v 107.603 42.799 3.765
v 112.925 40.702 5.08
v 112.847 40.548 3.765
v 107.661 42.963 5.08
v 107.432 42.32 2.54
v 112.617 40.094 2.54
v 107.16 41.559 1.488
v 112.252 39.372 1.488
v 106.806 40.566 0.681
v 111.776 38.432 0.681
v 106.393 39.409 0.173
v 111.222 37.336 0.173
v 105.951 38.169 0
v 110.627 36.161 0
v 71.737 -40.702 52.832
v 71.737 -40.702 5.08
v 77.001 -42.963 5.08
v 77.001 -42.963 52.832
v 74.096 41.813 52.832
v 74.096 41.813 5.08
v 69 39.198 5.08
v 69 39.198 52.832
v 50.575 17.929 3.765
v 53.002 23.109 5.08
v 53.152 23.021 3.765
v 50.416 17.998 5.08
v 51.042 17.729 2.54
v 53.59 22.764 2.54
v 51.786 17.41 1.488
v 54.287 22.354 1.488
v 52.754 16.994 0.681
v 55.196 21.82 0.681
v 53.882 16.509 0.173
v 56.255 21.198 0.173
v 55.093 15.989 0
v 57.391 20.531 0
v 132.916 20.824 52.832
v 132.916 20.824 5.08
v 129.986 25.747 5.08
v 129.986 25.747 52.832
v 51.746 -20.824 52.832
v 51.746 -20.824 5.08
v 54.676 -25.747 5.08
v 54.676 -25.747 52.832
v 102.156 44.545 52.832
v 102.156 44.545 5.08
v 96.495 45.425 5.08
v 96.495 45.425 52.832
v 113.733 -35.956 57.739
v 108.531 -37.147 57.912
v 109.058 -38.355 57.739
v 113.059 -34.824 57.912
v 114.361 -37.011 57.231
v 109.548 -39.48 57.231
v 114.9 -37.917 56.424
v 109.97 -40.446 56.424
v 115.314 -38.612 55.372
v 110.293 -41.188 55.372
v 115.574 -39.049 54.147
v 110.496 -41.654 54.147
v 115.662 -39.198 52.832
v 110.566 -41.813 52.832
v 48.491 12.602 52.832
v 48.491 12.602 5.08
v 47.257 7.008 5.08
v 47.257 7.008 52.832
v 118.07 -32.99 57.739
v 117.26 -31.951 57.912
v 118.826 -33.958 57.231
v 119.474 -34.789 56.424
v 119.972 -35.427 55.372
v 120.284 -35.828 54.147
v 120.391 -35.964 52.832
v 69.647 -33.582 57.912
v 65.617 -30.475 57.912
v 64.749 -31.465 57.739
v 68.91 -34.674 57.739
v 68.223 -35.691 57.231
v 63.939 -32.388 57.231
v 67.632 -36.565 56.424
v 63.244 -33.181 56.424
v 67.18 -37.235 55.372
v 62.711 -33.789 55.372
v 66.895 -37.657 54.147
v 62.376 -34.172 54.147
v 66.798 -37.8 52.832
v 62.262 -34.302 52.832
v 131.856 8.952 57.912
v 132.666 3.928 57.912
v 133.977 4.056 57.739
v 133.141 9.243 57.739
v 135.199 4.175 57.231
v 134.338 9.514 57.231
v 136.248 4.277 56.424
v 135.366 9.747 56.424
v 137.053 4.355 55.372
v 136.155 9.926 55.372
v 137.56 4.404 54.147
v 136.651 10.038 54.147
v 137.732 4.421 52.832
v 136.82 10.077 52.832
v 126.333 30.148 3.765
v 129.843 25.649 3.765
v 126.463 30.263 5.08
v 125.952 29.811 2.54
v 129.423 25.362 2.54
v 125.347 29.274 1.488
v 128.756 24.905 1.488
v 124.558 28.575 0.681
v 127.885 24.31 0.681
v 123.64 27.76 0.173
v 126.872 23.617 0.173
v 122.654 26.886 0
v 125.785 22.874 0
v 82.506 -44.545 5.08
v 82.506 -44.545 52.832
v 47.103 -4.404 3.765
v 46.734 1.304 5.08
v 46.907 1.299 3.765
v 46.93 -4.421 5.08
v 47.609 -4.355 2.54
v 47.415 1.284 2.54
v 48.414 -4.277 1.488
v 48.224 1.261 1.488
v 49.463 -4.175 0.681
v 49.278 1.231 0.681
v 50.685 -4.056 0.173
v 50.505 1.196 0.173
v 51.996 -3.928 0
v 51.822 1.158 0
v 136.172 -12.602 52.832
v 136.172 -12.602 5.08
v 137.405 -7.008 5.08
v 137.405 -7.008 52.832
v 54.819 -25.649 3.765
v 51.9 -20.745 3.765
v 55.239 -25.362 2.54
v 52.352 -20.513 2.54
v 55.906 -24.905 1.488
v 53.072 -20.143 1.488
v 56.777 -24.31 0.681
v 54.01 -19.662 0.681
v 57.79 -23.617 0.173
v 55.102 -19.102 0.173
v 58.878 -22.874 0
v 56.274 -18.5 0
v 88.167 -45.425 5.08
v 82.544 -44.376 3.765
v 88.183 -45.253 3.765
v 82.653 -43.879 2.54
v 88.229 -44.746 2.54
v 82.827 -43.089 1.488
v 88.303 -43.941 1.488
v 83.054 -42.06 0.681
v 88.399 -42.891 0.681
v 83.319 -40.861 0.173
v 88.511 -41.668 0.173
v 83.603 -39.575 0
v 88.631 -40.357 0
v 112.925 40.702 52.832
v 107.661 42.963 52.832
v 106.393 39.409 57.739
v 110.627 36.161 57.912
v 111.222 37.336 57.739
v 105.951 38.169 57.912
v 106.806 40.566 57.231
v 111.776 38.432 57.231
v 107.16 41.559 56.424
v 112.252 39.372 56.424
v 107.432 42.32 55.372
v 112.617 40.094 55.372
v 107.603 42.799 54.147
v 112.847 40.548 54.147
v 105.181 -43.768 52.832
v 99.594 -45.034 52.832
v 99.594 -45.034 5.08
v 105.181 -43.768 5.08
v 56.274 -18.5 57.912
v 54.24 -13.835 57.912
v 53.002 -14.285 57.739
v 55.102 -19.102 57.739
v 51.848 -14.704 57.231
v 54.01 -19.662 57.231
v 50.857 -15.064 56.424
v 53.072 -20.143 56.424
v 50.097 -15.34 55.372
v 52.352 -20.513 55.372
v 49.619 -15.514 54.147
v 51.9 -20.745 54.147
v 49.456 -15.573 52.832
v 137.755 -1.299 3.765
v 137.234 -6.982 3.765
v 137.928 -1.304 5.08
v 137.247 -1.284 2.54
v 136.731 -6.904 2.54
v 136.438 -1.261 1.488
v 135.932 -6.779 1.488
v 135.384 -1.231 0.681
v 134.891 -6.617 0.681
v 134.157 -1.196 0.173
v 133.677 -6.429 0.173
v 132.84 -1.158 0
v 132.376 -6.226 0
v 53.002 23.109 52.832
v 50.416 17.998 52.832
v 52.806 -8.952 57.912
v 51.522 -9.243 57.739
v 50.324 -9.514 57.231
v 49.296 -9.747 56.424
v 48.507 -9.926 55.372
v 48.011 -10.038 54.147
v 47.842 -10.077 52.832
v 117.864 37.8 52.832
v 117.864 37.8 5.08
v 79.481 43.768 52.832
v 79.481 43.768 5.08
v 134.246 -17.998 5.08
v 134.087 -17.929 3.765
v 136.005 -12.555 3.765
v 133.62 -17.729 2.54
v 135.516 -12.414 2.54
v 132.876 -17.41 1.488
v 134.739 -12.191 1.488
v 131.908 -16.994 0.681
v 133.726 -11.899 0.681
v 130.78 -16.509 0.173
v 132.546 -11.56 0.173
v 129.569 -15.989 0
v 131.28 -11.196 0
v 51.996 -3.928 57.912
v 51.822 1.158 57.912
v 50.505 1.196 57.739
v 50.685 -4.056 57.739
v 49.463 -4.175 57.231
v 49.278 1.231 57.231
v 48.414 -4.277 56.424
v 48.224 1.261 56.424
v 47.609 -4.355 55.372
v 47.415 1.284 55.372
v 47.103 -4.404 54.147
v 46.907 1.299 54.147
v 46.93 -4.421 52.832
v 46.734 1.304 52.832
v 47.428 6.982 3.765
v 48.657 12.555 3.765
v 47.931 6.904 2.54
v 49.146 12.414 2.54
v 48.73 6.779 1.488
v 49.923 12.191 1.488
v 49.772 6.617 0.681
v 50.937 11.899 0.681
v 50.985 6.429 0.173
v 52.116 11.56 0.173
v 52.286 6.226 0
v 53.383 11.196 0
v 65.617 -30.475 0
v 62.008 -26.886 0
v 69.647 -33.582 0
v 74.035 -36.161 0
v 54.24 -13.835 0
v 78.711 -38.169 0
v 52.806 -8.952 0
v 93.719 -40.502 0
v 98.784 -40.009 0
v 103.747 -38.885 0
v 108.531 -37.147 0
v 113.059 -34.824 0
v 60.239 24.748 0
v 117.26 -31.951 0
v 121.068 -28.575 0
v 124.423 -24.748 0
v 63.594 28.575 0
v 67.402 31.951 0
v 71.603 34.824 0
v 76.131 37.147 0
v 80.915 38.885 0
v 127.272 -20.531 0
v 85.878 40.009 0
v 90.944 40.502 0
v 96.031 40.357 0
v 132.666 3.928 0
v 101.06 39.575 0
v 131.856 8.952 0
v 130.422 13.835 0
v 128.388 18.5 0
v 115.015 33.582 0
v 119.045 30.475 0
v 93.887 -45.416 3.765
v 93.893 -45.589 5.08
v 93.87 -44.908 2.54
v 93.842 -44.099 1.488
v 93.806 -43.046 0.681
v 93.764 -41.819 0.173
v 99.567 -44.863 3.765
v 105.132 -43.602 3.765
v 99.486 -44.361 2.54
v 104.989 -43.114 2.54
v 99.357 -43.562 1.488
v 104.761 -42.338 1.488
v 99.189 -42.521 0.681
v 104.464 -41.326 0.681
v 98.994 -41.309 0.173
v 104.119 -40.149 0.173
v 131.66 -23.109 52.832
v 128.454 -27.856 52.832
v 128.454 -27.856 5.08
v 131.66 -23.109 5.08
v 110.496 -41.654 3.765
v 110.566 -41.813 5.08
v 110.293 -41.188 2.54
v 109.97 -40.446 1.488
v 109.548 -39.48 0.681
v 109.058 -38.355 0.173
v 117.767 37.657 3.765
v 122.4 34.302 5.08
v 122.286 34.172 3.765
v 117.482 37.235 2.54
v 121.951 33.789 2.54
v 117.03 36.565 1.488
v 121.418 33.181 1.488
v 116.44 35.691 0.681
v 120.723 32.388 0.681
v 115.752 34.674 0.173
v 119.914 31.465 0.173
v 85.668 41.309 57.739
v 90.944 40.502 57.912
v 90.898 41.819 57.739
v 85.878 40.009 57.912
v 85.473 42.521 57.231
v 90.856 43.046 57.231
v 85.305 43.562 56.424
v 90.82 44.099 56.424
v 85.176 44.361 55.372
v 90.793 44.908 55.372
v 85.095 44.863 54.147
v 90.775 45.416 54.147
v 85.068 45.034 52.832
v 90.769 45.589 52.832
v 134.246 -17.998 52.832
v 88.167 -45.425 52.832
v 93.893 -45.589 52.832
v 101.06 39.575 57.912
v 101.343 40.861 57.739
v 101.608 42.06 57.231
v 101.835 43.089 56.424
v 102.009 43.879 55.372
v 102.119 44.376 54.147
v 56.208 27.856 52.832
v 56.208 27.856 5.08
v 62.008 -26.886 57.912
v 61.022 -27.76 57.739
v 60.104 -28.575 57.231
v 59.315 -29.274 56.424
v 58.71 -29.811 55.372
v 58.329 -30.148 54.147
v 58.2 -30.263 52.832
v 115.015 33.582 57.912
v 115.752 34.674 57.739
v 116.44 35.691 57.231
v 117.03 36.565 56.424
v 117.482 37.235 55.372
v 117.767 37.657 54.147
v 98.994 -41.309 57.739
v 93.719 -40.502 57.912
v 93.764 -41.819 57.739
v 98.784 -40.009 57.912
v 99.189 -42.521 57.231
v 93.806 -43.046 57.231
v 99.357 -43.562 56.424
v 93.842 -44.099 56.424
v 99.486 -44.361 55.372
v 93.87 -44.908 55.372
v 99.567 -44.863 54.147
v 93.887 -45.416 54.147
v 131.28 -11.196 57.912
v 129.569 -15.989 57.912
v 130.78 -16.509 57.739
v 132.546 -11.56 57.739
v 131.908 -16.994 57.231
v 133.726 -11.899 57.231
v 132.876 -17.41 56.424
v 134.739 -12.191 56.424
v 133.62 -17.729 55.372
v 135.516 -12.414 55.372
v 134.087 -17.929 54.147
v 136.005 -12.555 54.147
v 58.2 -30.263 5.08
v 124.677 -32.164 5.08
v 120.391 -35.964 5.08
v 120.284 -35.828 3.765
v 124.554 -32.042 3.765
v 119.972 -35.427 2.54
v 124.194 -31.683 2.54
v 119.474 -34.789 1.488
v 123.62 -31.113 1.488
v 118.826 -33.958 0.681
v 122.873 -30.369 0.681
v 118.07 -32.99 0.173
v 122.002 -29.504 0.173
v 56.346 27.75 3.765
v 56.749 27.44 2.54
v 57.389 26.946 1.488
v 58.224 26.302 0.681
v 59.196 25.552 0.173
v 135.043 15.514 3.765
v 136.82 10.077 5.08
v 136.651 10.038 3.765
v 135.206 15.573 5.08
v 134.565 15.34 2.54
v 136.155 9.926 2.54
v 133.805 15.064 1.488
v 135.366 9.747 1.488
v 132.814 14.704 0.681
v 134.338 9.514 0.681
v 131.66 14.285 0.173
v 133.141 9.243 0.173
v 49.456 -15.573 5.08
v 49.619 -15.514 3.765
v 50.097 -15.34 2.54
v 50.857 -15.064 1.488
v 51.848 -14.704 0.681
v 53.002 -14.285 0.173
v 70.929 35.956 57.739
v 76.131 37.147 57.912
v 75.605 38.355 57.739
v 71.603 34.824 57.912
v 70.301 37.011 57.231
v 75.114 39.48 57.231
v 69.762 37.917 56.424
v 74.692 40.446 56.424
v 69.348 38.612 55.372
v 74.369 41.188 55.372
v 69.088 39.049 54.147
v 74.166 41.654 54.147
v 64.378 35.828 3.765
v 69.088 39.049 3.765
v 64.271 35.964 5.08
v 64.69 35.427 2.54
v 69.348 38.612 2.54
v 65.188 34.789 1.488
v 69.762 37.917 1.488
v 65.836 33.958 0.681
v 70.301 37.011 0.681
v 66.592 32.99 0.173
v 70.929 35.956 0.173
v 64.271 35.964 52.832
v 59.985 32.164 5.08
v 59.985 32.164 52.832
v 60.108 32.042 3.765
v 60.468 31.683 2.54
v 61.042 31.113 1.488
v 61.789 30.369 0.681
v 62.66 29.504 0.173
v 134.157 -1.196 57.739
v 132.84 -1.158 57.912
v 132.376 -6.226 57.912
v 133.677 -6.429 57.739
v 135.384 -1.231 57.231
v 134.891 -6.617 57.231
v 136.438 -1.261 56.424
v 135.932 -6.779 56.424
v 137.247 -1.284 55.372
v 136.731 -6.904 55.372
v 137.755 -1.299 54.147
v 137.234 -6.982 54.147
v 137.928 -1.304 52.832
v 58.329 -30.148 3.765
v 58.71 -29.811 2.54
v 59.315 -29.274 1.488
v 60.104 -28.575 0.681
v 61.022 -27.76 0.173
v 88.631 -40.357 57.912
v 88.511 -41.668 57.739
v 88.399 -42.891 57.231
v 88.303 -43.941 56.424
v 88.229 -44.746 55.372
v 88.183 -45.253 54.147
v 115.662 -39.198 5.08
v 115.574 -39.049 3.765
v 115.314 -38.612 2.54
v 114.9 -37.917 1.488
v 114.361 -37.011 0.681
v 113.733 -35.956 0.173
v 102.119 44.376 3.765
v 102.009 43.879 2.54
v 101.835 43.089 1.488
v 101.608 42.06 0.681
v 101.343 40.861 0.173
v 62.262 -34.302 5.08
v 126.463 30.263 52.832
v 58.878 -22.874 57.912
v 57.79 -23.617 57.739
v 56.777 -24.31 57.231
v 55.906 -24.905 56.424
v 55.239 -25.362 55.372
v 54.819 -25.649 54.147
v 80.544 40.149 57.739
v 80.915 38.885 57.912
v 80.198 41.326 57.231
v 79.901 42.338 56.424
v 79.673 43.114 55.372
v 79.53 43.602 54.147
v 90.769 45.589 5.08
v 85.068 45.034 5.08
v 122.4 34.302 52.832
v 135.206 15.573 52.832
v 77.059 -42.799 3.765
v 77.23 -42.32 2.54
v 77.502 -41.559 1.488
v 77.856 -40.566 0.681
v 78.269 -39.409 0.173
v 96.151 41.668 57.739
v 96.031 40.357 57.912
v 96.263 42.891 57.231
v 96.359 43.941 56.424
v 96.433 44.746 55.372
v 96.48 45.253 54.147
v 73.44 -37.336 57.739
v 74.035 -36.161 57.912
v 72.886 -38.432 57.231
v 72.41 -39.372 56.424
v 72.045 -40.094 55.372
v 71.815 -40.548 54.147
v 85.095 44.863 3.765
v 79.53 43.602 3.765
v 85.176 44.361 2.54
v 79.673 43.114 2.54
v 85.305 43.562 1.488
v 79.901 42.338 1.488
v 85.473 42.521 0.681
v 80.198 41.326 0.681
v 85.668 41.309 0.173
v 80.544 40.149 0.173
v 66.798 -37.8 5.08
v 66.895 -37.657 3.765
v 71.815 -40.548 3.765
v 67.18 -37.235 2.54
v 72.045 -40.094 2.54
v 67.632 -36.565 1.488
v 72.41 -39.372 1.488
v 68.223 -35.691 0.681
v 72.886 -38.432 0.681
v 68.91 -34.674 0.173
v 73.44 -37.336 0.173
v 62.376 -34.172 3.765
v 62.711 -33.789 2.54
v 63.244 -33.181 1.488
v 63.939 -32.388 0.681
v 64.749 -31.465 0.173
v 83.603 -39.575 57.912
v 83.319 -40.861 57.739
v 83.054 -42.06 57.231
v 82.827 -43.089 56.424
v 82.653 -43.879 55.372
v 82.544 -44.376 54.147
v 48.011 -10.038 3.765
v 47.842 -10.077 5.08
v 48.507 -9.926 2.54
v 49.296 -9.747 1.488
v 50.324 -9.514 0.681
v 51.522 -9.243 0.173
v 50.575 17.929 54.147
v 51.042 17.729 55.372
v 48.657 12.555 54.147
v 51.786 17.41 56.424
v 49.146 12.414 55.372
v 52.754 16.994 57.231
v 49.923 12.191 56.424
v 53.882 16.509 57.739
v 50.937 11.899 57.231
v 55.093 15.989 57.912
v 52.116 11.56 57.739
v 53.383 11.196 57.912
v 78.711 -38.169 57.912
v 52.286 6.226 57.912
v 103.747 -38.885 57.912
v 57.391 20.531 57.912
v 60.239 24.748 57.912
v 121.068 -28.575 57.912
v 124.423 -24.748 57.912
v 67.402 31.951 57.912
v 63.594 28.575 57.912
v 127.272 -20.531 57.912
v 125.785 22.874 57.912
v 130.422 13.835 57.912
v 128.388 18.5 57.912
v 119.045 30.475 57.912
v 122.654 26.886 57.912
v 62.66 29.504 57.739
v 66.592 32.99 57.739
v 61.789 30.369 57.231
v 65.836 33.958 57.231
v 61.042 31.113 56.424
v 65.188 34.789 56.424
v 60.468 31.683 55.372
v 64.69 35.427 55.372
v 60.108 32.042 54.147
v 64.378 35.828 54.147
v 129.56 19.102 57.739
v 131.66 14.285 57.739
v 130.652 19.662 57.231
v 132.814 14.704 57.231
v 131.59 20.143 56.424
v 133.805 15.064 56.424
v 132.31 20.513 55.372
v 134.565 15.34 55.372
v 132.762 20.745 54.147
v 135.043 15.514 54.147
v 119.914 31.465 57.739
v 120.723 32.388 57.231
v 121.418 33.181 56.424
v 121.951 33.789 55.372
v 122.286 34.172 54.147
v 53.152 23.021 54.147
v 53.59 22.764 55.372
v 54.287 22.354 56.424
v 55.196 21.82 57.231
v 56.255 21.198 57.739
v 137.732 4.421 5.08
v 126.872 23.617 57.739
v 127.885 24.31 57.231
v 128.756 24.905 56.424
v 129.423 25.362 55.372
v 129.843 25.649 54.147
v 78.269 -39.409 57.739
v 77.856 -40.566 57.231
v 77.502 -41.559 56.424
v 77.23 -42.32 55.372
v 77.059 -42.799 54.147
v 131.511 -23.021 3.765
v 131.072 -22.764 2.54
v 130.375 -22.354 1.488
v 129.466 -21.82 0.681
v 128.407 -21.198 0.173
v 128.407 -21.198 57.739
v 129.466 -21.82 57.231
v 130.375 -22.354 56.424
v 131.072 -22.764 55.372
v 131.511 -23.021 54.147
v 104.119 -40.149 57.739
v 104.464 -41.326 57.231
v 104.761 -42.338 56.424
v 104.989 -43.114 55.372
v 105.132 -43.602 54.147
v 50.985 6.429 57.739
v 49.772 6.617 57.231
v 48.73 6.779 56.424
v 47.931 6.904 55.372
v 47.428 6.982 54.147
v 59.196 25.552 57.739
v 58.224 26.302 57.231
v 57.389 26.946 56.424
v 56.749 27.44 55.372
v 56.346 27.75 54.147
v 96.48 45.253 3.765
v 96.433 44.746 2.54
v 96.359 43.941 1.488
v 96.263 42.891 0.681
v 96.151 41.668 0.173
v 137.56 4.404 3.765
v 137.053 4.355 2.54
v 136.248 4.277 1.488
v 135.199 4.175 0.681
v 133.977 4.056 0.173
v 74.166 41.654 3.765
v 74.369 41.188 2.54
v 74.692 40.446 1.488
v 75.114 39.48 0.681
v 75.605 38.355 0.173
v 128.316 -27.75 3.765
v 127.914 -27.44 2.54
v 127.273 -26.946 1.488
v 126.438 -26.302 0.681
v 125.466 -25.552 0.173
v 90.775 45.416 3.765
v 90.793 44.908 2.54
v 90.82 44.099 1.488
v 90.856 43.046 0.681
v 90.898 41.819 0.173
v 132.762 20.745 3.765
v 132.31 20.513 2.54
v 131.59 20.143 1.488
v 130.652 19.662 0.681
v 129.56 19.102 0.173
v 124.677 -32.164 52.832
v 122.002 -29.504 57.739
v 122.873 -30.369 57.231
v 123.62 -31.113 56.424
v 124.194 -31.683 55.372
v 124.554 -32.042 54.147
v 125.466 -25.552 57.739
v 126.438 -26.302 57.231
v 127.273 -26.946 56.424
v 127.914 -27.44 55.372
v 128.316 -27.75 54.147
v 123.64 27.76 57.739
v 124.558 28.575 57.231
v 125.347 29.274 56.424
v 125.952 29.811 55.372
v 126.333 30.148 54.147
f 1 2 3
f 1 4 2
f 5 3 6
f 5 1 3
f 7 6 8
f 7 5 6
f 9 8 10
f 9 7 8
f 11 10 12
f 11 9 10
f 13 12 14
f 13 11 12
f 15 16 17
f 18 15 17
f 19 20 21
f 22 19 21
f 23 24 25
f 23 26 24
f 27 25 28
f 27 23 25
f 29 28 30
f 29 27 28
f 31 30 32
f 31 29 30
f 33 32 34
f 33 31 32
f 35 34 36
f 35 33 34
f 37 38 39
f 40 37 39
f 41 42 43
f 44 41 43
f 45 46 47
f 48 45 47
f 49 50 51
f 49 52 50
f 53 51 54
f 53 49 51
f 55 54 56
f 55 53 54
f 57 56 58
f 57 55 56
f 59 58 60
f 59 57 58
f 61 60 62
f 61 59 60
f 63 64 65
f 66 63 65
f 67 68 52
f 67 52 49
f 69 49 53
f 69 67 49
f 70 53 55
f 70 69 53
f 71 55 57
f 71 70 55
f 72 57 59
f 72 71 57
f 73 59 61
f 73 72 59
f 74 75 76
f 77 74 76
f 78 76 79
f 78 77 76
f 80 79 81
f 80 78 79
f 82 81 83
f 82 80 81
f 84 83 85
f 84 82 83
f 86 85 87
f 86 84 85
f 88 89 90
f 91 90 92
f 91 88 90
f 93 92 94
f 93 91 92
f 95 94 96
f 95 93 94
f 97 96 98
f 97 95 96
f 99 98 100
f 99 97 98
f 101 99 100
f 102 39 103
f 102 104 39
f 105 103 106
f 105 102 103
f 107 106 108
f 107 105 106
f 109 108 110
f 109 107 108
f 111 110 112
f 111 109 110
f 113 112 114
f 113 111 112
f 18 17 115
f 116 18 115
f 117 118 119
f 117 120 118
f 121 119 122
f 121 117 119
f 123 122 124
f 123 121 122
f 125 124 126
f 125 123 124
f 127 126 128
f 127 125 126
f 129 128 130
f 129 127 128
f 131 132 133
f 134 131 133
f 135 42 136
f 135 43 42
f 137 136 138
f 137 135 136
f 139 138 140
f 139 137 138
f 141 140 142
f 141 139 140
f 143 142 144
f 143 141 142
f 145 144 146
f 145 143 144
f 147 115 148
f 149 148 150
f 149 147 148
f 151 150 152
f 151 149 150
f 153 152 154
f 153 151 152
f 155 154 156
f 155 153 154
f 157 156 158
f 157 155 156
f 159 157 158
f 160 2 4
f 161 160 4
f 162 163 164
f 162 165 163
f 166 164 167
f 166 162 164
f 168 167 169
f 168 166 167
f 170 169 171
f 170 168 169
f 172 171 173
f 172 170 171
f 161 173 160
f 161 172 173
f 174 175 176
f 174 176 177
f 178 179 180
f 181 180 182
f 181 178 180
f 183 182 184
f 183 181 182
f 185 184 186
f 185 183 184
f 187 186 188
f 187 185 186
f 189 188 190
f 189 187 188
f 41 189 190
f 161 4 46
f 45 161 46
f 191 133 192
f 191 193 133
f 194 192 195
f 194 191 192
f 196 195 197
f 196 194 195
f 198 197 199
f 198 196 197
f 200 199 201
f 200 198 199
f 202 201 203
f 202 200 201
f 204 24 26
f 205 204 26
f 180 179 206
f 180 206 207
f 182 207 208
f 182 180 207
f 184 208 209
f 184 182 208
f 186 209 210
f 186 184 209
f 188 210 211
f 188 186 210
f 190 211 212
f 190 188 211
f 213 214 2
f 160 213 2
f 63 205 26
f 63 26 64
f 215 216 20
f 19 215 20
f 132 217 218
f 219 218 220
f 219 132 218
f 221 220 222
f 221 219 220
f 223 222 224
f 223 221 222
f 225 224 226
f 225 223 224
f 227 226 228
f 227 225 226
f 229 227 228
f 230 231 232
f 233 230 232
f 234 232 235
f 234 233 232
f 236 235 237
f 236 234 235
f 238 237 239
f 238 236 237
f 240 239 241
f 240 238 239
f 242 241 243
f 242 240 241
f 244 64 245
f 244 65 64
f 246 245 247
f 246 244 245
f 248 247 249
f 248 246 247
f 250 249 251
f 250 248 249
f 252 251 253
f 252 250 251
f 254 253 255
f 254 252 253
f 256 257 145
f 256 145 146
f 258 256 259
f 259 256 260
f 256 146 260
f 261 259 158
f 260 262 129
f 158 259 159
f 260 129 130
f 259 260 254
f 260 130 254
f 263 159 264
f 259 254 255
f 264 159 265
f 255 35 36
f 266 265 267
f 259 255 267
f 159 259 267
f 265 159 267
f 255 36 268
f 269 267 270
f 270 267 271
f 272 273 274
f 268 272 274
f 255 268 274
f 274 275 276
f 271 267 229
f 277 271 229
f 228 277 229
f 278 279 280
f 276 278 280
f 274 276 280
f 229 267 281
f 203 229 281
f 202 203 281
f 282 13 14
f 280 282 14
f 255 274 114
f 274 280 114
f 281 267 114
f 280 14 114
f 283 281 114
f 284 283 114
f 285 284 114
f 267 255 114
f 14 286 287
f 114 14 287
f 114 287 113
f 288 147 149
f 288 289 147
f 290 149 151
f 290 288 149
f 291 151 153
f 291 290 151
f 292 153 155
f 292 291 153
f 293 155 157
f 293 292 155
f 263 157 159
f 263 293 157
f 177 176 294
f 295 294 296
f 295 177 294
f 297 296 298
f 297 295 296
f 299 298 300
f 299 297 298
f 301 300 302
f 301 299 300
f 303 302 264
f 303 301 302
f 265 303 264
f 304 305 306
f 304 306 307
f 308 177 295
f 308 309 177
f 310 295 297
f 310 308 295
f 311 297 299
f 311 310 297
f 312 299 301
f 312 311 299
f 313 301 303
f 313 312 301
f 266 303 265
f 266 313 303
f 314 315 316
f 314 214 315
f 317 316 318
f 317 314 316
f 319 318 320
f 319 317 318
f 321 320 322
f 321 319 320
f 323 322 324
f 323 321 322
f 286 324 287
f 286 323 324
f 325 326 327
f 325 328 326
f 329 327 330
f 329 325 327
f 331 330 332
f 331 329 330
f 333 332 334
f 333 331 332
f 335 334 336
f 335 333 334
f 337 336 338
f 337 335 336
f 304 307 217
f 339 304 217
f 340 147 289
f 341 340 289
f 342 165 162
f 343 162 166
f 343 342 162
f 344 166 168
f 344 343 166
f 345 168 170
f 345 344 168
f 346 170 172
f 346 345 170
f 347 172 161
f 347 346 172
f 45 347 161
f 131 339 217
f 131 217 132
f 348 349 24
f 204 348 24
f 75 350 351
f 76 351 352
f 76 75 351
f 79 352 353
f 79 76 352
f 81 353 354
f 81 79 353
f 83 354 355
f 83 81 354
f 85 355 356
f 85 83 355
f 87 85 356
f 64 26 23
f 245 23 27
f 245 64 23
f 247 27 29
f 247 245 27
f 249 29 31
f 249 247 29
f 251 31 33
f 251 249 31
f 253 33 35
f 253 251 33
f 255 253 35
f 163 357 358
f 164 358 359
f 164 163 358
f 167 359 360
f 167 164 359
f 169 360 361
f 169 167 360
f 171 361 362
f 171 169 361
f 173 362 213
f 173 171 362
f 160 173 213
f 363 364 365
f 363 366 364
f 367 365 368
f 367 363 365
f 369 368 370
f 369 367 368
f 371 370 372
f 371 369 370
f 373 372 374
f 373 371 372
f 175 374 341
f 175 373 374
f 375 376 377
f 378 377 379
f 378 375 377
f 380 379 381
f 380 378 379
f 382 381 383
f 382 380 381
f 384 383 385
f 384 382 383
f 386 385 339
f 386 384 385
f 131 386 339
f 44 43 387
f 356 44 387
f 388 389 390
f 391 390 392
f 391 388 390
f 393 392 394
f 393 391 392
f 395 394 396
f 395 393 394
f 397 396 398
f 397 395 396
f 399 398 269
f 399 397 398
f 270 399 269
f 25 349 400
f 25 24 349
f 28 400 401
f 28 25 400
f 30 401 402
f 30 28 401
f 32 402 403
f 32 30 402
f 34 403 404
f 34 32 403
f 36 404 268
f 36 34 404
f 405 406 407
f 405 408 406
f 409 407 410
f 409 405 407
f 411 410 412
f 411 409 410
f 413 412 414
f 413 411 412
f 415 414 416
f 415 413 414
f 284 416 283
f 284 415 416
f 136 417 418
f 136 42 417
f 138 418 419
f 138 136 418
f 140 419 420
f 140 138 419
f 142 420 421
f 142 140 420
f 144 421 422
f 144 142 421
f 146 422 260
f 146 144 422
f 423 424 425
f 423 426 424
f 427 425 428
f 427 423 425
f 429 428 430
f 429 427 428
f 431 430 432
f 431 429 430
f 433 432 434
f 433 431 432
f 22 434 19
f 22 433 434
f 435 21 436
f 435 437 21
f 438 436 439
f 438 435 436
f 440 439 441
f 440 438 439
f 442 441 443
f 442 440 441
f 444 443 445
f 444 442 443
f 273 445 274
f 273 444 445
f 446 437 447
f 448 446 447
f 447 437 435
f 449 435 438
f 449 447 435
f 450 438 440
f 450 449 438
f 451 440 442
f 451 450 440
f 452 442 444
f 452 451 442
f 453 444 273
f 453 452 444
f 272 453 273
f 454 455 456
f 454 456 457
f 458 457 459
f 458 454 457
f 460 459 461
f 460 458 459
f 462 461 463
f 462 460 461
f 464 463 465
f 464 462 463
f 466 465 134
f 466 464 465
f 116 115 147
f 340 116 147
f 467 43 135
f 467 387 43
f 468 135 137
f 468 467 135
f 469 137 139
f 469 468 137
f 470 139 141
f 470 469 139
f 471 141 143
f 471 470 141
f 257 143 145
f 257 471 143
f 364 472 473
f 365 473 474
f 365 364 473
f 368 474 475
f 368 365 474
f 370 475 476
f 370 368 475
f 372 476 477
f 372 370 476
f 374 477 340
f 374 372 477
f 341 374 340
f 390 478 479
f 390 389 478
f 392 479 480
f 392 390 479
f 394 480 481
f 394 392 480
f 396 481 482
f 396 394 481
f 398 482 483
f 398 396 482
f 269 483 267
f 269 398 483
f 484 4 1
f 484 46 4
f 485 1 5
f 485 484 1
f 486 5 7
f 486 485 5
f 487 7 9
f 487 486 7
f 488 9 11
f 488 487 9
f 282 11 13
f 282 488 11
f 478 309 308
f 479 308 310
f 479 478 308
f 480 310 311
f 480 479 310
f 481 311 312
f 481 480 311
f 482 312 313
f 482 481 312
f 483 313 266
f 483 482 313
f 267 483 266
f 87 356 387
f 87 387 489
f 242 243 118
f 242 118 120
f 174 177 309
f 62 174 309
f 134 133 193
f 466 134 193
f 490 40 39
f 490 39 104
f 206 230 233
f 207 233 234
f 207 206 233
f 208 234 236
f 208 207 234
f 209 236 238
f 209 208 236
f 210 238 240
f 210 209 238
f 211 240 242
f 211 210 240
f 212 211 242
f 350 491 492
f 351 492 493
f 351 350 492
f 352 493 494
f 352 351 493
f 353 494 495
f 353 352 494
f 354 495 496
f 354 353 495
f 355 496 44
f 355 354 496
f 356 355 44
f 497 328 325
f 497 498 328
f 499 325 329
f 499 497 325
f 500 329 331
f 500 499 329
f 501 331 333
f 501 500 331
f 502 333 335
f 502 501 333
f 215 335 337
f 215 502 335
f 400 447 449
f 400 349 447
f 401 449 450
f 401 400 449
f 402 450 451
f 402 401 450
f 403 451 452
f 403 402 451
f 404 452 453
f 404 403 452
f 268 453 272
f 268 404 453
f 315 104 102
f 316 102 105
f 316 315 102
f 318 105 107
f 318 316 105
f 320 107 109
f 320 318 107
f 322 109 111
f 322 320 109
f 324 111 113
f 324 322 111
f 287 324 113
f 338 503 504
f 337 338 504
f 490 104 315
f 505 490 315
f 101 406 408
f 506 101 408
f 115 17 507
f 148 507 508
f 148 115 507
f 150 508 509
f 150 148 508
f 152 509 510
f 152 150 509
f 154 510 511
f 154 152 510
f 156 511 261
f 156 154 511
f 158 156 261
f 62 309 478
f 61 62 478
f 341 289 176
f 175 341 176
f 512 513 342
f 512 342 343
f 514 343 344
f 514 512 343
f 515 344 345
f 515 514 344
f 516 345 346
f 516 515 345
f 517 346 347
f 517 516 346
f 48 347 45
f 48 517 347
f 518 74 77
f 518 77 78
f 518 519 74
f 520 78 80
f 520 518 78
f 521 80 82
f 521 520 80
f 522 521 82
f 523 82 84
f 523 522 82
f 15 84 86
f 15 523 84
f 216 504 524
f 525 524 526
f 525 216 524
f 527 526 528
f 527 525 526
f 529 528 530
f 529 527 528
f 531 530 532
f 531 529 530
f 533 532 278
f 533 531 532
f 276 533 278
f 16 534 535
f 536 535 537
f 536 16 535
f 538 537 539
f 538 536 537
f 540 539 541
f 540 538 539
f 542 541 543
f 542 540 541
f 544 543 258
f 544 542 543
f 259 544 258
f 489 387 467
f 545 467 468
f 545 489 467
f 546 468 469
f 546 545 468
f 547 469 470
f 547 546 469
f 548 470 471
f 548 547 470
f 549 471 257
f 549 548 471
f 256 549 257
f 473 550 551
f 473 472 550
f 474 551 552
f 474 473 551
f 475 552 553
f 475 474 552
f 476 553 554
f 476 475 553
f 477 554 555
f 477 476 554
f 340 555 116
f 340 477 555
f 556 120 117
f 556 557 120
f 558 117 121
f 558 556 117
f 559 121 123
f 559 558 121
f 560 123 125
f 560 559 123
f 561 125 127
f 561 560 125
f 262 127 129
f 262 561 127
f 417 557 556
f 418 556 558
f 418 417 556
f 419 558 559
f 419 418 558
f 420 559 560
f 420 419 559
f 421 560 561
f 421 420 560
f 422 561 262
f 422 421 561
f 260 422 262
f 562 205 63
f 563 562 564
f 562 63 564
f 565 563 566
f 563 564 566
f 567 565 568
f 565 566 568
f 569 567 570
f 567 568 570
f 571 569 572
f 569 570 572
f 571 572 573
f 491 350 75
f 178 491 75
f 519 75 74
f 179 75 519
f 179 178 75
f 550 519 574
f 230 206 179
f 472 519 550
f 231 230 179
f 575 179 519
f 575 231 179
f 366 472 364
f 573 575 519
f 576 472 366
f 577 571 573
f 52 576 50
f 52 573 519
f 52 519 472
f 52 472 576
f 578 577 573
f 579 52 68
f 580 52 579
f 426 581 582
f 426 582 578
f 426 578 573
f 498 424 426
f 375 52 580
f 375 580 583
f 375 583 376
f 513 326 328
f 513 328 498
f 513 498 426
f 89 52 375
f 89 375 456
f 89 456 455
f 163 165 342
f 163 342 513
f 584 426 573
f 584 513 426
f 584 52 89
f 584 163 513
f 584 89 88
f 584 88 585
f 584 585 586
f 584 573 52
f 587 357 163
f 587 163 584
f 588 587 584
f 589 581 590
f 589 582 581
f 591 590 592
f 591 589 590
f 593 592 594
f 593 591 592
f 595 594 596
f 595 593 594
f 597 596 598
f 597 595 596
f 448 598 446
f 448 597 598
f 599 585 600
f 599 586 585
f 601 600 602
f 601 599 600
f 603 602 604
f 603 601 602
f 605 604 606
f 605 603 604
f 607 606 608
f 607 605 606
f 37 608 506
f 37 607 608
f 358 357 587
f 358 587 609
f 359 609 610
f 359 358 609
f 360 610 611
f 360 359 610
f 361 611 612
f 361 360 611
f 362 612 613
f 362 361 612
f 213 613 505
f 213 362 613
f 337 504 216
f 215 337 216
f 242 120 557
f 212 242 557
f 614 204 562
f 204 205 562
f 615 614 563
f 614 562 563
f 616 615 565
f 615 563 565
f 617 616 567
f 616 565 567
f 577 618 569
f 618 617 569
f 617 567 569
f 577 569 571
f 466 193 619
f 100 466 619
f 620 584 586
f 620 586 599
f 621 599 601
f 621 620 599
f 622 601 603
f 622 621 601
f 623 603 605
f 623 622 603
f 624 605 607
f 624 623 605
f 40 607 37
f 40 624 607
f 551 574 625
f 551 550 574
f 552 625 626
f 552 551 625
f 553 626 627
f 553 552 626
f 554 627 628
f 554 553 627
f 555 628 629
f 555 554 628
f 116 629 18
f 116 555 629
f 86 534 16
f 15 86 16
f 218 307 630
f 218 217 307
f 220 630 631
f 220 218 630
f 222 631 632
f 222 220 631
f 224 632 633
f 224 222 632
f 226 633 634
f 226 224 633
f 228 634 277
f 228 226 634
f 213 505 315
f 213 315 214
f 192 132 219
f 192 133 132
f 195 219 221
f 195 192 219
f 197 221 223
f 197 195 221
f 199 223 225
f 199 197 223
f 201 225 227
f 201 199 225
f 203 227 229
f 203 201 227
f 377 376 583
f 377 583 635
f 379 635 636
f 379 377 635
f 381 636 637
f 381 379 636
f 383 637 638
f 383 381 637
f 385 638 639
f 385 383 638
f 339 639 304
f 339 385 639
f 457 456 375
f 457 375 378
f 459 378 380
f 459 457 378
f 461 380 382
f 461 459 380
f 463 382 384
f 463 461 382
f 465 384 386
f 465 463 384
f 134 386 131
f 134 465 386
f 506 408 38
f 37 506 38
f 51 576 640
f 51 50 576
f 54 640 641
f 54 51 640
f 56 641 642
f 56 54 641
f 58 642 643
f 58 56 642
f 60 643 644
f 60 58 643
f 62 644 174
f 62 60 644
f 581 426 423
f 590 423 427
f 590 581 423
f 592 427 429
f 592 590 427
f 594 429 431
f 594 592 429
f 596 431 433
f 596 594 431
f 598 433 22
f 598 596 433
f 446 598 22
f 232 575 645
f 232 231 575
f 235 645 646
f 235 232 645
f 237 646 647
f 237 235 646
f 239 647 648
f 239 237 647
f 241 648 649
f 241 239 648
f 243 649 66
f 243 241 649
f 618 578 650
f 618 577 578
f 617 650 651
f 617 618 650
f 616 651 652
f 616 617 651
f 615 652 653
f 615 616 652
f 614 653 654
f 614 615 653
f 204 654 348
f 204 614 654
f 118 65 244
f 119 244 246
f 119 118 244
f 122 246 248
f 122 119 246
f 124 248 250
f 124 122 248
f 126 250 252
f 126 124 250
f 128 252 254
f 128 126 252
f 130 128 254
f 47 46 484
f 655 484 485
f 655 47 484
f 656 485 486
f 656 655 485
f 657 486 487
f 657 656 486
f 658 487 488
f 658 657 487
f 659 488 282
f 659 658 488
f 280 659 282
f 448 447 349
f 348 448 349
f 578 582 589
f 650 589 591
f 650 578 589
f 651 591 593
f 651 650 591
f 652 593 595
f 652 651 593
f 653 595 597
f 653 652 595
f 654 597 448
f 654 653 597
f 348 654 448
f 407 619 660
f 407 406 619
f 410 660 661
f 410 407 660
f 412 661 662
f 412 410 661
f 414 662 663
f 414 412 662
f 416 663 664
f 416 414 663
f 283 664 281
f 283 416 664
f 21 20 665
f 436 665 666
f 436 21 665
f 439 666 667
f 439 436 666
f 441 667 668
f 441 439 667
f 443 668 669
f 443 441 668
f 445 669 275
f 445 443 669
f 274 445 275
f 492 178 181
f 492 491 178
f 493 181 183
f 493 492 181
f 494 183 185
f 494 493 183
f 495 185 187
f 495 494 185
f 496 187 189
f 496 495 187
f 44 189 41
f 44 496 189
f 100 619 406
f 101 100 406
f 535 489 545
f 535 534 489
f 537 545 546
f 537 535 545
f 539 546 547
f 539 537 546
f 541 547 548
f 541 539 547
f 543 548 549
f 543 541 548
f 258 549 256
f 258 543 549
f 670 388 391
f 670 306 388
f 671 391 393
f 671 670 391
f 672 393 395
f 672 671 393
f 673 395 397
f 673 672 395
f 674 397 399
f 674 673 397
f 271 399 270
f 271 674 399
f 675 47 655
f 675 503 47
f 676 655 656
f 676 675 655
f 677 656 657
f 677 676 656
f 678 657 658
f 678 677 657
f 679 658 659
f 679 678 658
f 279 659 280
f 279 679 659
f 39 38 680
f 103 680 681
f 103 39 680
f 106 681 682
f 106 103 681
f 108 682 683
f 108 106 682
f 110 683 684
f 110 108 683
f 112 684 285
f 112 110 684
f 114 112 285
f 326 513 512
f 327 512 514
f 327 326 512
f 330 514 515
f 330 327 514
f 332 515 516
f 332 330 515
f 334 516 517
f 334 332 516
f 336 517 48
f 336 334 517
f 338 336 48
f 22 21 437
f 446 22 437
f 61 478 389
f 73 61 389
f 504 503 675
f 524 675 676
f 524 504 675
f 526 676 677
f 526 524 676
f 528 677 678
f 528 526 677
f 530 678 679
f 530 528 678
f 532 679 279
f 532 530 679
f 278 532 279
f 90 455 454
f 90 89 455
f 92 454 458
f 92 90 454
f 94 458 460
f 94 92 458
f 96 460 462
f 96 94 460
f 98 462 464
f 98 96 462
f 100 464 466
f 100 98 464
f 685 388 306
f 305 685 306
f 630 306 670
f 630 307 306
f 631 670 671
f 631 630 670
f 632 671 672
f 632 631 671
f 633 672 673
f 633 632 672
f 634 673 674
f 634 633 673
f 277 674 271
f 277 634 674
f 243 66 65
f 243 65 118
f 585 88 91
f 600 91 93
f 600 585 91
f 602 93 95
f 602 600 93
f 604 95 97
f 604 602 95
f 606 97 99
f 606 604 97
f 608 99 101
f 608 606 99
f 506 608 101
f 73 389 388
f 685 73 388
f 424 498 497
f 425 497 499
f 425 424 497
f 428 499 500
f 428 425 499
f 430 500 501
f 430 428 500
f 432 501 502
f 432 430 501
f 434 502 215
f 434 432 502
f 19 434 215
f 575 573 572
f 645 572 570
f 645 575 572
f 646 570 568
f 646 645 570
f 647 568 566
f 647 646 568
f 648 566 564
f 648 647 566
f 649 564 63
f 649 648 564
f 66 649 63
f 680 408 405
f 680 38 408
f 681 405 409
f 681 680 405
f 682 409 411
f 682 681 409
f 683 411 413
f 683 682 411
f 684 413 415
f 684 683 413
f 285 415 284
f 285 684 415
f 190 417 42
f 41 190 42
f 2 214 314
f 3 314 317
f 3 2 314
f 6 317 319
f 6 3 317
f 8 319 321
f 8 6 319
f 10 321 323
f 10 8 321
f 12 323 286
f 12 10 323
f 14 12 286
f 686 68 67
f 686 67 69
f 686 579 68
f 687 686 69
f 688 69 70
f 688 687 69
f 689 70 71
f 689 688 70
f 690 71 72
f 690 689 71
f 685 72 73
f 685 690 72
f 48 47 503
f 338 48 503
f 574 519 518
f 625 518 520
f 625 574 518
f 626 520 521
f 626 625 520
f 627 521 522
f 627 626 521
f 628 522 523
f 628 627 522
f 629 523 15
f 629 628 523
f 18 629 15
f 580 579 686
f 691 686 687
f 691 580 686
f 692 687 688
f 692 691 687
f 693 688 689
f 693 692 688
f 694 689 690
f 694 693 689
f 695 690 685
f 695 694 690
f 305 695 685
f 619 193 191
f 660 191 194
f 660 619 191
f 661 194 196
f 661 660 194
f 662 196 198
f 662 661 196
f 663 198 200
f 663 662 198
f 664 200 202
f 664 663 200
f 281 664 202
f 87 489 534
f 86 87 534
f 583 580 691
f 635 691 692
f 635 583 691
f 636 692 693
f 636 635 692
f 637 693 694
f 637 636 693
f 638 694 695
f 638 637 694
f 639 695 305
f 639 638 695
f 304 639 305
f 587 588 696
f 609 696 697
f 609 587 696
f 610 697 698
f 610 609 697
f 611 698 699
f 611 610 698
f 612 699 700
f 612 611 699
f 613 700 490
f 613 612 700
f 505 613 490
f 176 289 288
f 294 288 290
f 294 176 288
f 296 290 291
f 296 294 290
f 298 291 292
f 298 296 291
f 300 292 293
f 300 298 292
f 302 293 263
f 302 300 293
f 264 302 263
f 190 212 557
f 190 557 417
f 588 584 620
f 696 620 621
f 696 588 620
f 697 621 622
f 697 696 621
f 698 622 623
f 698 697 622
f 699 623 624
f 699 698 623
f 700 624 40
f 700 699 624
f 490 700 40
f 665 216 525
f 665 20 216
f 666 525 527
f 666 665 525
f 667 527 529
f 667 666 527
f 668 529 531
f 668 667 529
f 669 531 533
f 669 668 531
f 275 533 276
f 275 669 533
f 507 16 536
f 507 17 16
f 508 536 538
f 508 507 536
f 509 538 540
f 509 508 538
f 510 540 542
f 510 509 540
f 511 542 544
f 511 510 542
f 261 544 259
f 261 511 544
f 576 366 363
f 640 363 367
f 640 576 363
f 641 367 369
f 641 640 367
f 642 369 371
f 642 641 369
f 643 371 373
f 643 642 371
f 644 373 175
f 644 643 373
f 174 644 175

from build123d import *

# Parameters (mm, degrees)
F1_DEPTH = 57.912
F2_R     = 5.08
F3_R     = 5.08


with BuildPart() as f1:
    # F0 (on Top) → F1 (new body)
    with BuildSketch(Plane.XY):
        Polygon((50.415788, 17.997737), (48.490588, 12.602444), (47.256778, 7.008404), (46.733816, 1.303837), (46.929949, -4.421292), (47.842085, -10.076695), (49.455839, -15.573182), (51.74576, -20.824071), (54.675735, -25.746552), (58.199557, -30.262995), (62.261653, -34.302171), (66.797961, -37.800383), (71.736942, -40.702459), (77.000703, -42.962634), (82.506233, -44.545262), (88.166706, -45.425384), (93.892854, -45.589122), (99.59437, -45.033891), (105.18134, -43.768449), (110.565653, -41.812753), (115.662395, -39.197644), (120.391188, -35.964366), (124.677456, -32.163907), (128.453601, -27.856205), (131.660072, -23.109194), (134.246301, -17.997737), (136.171501, -12.602444), (137.405311, -7.008404), (137.928273, -1.303837), (137.732139, 4.421292), (136.820003, 10.076695), (135.20625, 15.573182), (132.916329, 20.824071), (129.986353, 25.746552), (126.462531, 30.262995), (122.400436, 34.302171), (117.864127, 37.800383), (112.925147, 40.702459), (107.661386, 42.962634), (102.155856, 44.545262), (96.495382, 45.425384), (90.769235, 45.589122), (85.067718, 45.033891), (79.480749, 43.768449), (74.096436, 41.812753), (68.999694, 39.197644), (64.270901, 35.964366), (59.984633, 32.163907), (56.208488, 27.856205), (53.002017, 23.109194), align=None)
    extrude(amount=F1_DEPTH)

    # F2
    f2_edges = [f1.edges().sort_by_distance(p)[0] for p in [
        (124.431484, 32.282583, 0),
        (120.132281, 36.051277, 0),
        (115.394637, 39.251421, 0),
        (110.293266, 41.832546, 0),
        (104.908621, 43.753948, 0),
        (99.325619, 44.985323, 0),
        (93.632309, 45.507253, 0),
        (87.918477, 45.311506, 0),
        (82.274233, 44.40117, 0),
        (76.788592, 42.790601, 0),
        (71.548065, 40.505199, 0),
        (66.635297, 37.581005, 0),
        (62.127767, 34.064136, 0),
        (58.09656, 30.010056, 0),
        (54.605252, 25.482699, 0),
        (51.708902, 20.553465, 0),
        (49.453188, 15.30009, 0),
        (47.873683, 9.805424, 0),
        (46.995297, 4.156121, 0),
        (46.831883, -1.558727, 0),
        (47.386017, -7.248994, 0),
        (48.648962, -12.824939, 0),
        (50.600799, -18.198627, 0),
        (53.210748, -23.285312, 0),
        (56.437646, -28.004773, 0),
        (60.230605, -32.282583, 0),
        (64.529807, -36.051277, 0),
        (69.267451, -39.251421, 0),
        (74.368822, -41.832546, 0),
        (79.753468, -43.753948, 0),
        (85.33647, -44.985323, 0),
        (91.02978, -45.507253, 0),
        (96.743612, -45.311506, 0),
        (102.387855, -44.40117, 0),
        (107.873497, -42.790601, 0),
        (113.114024, -40.505199, 0),
        (118.026792, -37.581005, 0),
        (122.534322, -34.064136, 0),
        (126.565528, -30.010056, 0),
        (130.056837, -25.482699, 0),
        (132.953187, -20.553465, 0),
        (135.208901, -15.30009, 0),
        (136.788406, -9.805424, 0),
        (137.666792, -4.156121, 0),
        (137.830206, 1.558727, 0),
        (137.276071, 7.248994, 0),
        (136.013127, 12.824939, 0),
        (134.061289, 18.198627, 0),
        (131.451341, 23.285312, 0),
        (128.224442, 28.004773, 0),
    ]]
    fillet(f2_edges, radius=F2_R)

    # F3
    f3_edges = [f1.edges().sort_by_distance(p)[0] for p in [
        (124.431484, 32.282583, 57.912),
        (120.132281, 36.051277, 57.912),
        (115.394637, 39.251421, 57.912),
        (110.293266, 41.832546, 57.912),
        (104.908621, 43.753948, 57.912),
        (99.325619, 44.985323, 57.912),
        (93.632309, 45.507253, 57.912),
        (87.918477, 45.311506, 57.912),
        (82.274233, 44.40117, 57.912),
        (76.788592, 42.790601, 57.912),
        (71.548065, 40.505199, 57.912),
        (66.635297, 37.581005, 57.912),
        (62.127767, 34.064136, 57.912),
        (58.09656, 30.010056, 57.912),
        (54.605252, 25.482699, 57.912),
        (51.708902, 20.553465, 57.912),
        (49.453188, 15.30009, 57.912),
        (47.873683, 9.805424, 57.912),
        (46.995297, 4.156121, 57.912),
        (46.831883, -1.558727, 57.912),
        (47.386017, -7.248994, 57.912),
        (48.648962, -12.824939, 57.912),
        (50.600799, -18.198627, 57.912),
        (53.210748, -23.285312, 57.912),
        (56.437646, -28.004773, 57.912),
        (60.230605, -32.282583, 57.912),
        (64.529807, -36.051277, 57.912),
        (69.267451, -39.251421, 57.912),
        (74.368822, -41.832546, 57.912),
        (79.753468, -43.753948, 57.912),
        (85.33647, -44.985323, 57.912),
        (91.02978, -45.507253, 57.912),
        (96.743612, -45.311506, 57.912),
        (102.387855, -44.40117, 57.912),
        (107.873497, -42.790601, 57.912),
        (113.114024, -40.505199, 57.912),
        (118.026792, -37.581005, 57.912),
        (122.534322, -34.064136, 57.912),
        (126.565528, -30.010056, 57.912),
        (130.056837, -25.482699, 57.912),
        (132.953187, -20.553465, 57.912),
        (135.208901, -15.30009, 57.912),
        (136.788406, -9.805424, 57.912),
        (137.666792, -4.156121, 57.912),
        (137.830206, 1.558727, 57.912),
        (137.276071, 7.248994, 57.912),
        (136.013127, 12.824939, 57.912),
        (134.061289, 18.198627, 57.912),
        (131.451341, 23.285312, 57.912),
        (128.224442, 28.004773, 57.912),
    ]]
    fillet(f3_edges, radius=F3_R)


solid = f1.part
